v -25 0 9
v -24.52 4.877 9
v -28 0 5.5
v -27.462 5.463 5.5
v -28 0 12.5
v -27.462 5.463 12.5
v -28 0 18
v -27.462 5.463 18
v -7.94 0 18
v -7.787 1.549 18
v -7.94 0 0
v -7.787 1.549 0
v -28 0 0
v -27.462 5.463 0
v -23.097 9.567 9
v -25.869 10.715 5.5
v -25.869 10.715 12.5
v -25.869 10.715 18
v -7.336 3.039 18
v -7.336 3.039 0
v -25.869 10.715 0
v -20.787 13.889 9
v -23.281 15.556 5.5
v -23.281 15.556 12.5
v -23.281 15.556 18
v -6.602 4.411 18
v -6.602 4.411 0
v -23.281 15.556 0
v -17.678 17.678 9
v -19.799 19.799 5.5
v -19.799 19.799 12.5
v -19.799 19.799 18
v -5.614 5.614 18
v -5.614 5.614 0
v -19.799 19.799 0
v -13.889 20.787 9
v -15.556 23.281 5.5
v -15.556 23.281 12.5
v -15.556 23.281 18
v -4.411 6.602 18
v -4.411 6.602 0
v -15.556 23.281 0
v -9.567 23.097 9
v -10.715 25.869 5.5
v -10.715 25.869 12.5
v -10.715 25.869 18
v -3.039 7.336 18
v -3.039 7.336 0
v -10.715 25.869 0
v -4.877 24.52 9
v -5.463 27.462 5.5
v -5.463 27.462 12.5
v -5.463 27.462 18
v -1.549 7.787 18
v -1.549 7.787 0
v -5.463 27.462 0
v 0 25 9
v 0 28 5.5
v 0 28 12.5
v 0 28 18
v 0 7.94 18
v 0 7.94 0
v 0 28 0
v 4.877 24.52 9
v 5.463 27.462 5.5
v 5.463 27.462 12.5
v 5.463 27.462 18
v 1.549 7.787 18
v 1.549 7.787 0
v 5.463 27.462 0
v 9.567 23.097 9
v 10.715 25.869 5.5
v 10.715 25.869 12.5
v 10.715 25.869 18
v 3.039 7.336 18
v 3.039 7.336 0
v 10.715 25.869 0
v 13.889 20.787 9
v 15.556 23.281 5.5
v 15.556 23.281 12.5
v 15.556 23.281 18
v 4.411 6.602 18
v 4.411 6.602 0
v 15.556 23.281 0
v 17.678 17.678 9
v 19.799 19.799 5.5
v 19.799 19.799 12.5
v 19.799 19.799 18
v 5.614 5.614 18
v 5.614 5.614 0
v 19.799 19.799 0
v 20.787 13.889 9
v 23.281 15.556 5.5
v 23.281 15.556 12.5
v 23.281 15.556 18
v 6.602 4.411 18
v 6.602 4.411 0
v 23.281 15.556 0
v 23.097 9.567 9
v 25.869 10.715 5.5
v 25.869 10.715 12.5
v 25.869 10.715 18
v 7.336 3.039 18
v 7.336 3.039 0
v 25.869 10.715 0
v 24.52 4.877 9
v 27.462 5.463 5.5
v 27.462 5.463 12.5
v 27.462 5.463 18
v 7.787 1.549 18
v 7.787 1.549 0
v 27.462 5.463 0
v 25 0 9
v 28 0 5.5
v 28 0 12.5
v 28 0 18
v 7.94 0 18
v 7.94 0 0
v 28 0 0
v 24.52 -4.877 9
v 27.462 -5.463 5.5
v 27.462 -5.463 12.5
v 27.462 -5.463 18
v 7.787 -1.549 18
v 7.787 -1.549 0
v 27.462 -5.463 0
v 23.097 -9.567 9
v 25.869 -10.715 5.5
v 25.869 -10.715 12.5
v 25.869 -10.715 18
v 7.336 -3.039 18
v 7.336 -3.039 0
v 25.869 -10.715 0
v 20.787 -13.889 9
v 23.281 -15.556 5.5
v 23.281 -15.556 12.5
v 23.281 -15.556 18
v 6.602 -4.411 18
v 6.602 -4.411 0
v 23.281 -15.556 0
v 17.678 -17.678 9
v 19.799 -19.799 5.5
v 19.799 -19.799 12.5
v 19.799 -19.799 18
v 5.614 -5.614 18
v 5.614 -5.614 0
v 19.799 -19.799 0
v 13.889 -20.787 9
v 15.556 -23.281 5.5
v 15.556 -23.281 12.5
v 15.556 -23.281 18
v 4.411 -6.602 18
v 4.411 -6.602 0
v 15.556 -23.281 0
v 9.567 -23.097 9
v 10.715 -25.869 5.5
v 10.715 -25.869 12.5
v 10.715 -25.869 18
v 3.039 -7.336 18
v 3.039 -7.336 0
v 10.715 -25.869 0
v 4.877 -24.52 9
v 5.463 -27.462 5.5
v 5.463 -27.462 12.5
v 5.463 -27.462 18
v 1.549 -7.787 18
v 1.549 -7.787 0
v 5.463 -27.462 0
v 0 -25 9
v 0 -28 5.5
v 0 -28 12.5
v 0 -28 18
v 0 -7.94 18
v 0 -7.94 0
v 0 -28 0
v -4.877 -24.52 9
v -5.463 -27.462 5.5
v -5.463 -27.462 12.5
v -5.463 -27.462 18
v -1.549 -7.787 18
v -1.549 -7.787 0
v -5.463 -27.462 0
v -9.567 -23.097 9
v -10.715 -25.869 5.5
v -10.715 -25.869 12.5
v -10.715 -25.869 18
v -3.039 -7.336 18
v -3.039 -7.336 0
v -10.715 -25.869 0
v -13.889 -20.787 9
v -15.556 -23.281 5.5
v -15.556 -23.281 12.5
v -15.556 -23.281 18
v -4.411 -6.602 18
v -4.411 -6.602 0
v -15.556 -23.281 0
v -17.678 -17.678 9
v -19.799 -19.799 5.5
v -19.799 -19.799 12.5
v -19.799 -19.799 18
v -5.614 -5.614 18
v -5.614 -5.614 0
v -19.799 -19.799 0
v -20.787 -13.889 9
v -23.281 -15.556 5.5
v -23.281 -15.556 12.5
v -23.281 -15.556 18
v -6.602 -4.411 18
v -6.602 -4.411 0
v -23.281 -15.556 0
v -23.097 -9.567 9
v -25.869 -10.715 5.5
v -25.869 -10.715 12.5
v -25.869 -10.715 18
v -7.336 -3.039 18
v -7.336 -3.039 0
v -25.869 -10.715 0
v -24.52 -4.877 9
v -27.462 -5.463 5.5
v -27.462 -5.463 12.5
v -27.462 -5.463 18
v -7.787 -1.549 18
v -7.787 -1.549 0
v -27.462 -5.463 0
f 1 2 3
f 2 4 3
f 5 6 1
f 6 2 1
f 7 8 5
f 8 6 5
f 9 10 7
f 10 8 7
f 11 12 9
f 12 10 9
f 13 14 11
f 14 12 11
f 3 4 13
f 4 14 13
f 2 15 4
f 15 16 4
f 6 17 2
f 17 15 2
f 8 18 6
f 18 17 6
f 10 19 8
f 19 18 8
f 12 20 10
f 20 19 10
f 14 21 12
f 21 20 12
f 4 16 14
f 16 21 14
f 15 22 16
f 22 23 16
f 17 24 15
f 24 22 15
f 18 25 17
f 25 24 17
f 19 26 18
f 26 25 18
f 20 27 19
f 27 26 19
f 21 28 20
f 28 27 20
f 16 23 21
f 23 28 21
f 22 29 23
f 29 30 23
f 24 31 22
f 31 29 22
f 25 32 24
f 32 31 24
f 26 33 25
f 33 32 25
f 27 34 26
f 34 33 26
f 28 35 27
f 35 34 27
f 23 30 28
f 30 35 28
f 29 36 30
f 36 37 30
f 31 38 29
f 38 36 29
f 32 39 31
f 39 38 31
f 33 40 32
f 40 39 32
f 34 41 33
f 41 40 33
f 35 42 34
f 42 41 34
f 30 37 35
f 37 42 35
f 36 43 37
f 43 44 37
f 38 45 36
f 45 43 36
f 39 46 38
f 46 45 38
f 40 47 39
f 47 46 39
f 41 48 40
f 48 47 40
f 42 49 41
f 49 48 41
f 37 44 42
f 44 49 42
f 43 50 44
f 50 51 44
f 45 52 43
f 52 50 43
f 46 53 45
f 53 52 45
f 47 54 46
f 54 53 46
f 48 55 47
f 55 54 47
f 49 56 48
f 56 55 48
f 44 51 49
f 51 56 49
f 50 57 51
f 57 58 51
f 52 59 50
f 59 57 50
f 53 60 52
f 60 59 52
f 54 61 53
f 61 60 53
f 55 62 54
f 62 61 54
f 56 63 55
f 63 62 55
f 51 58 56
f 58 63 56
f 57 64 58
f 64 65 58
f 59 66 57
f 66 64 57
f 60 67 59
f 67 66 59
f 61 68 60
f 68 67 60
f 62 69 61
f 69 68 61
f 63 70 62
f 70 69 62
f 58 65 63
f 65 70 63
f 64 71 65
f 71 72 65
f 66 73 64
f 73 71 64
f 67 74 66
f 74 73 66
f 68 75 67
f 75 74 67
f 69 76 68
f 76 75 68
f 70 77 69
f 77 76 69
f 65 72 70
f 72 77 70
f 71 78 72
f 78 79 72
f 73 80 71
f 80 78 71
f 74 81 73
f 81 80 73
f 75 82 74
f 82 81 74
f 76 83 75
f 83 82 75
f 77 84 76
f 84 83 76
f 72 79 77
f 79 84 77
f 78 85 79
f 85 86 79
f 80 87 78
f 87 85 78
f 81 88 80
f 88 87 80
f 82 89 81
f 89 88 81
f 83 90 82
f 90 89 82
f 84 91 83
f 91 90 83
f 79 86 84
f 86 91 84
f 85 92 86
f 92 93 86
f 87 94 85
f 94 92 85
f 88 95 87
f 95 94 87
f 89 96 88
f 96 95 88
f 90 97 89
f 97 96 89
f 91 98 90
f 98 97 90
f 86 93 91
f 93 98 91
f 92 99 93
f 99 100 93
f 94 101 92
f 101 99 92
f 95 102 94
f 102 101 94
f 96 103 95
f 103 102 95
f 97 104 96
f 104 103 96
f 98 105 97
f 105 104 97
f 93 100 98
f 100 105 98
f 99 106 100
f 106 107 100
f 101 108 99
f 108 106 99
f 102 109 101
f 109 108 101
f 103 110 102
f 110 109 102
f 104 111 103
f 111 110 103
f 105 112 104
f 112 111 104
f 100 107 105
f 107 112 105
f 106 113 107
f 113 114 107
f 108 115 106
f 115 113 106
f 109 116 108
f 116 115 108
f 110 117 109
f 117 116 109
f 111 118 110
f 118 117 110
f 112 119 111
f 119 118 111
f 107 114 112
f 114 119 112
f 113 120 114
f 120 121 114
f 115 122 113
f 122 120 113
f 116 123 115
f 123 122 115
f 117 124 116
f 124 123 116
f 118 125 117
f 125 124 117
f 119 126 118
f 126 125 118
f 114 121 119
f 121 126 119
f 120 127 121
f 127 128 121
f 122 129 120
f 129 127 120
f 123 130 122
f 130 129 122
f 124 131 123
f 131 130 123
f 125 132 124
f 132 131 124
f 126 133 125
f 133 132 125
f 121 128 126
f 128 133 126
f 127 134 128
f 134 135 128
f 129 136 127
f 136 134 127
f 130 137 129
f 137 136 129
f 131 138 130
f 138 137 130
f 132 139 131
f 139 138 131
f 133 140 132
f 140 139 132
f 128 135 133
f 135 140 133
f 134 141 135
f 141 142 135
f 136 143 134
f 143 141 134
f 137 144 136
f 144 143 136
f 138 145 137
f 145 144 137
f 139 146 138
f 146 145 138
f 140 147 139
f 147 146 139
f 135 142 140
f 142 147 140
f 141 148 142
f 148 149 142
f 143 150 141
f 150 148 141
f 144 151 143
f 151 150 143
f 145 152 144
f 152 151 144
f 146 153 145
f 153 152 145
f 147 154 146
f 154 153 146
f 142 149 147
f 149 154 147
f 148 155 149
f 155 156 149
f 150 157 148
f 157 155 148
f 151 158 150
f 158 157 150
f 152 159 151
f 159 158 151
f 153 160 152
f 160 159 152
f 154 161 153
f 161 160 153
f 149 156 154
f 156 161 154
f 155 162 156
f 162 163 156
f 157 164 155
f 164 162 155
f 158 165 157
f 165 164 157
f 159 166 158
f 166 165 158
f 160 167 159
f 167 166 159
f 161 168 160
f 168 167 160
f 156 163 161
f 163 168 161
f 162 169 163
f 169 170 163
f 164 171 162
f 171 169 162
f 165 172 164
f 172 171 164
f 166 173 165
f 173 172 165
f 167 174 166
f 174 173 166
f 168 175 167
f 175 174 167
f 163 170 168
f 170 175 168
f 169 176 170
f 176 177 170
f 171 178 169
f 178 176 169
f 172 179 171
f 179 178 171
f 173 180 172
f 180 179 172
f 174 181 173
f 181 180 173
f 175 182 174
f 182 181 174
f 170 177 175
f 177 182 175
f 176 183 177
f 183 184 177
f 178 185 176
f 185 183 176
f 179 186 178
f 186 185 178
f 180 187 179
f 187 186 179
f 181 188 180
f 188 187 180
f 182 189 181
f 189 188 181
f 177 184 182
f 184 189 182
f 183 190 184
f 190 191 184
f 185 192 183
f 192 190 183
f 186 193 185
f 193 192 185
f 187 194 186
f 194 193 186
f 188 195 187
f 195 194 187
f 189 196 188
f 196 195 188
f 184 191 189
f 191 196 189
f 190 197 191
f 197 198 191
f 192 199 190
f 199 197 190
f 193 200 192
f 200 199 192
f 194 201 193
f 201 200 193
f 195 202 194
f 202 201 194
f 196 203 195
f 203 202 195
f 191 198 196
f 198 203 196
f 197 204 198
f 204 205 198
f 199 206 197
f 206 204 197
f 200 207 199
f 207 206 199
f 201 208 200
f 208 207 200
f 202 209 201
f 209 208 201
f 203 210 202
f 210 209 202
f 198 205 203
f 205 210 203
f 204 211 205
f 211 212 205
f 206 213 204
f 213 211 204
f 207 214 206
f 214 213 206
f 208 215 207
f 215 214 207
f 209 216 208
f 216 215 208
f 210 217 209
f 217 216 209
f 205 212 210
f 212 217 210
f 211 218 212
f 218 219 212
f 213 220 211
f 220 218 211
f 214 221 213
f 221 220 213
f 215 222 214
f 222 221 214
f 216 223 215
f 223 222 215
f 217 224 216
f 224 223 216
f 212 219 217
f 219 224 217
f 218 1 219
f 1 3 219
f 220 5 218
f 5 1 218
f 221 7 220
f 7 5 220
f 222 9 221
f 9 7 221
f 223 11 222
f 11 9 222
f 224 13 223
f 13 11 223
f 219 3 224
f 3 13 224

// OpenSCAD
$fn = 32;

// ----------------------------------------------------------------------
// Belt roller: 56 mm barrel, 18 mm wide, bore 15.88 mm
// ----------------------------------------------------------------------

// --- parameters (mm) ---
bore_d = 15.88;           // bore
barrel_d = 56;            // barrel diameter
roller_w = 18;            // roller width
groove_w = 7;             // guide groove width
groove_d = 3;             // guide groove depth

roller_profile = [[7.94, 0], [28, 0], [28, 5.5], [25, 9], [28, 12.5], [28, 18], [7.94, 18]];

/* the profile stays clear of the axis, so the bore comes out of the revolve */
rotate_extrude() polygon(roller_profile);
